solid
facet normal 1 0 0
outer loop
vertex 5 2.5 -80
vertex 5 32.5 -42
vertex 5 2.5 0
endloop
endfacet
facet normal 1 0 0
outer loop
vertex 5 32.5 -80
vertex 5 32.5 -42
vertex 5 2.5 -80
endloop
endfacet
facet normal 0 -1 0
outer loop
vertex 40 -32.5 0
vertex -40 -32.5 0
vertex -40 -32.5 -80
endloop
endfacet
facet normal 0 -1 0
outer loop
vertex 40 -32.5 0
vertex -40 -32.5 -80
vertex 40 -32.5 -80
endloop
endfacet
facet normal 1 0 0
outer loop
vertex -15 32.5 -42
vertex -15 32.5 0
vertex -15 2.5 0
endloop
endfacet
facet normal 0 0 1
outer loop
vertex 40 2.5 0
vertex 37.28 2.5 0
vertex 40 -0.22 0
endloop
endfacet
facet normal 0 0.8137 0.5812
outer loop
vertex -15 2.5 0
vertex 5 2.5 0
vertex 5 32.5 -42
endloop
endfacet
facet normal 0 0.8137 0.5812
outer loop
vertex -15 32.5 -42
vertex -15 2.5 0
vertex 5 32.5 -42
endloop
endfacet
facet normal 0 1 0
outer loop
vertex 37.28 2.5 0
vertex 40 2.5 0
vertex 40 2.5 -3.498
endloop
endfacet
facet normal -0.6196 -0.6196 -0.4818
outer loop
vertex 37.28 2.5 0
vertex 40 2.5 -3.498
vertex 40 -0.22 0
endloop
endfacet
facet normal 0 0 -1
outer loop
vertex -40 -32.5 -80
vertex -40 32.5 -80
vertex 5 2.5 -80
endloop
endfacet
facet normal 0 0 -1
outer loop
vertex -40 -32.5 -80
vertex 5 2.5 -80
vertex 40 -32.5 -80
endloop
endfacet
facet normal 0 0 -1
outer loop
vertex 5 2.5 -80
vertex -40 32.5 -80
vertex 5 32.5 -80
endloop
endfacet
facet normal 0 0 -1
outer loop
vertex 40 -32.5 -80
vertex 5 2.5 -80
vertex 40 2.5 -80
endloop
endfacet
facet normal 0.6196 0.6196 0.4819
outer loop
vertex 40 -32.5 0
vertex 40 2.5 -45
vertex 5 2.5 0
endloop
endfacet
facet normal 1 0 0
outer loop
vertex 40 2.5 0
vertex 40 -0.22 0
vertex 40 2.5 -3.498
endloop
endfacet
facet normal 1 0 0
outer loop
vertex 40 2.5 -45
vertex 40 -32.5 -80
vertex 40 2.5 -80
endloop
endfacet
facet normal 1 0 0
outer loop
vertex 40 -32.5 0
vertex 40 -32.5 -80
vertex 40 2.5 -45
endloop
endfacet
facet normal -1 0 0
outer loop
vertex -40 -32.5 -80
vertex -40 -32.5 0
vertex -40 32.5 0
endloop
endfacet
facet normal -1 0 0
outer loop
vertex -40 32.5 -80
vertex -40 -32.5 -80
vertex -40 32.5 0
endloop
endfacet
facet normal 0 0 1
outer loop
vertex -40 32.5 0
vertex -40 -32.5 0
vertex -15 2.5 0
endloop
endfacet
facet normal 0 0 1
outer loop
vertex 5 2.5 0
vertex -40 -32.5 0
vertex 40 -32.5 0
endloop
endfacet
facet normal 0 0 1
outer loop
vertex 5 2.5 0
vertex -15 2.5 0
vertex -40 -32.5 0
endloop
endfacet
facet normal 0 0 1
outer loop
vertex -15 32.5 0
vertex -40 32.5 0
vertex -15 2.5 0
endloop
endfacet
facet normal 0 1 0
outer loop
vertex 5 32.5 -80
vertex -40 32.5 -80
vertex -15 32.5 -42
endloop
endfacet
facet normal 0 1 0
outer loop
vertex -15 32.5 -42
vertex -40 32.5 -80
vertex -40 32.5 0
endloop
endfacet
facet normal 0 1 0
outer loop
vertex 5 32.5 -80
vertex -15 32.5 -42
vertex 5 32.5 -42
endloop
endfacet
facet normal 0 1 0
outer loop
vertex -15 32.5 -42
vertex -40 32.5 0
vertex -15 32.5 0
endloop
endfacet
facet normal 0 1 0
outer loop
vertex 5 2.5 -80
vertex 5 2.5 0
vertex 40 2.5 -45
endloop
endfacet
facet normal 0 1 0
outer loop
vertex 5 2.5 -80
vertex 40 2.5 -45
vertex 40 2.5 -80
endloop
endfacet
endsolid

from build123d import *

# Parameters (mm, degrees)
SKETCH1_W           = 80
SKETCH1_H           = 65
BOSS_EXTRUDE1_DEPTH = 80
SKETCH2_W           = 80
SKETCH2_H           = 30
CUT_EXTRUDE1_DEPTH  = 35
CUT_EXTRUDE2_DEPTH  = 20
CUT_EXTRUDE8_DEPTH  = 20


with BuildPart() as part:
    # Sketch1 → Boss-Extrude1 (new body)
    with BuildSketch(Plane.XY):
        Rectangle(SKETCH1_W, SKETCH1_H)
    extrude(amount=-BOSS_EXTRUDE1_DEPTH)

    # Sketch2 → Cut-Extrude1 (cut)
    with BuildSketch(Plane(origin=(40, 0, 0), x_dir=(0, 0, -1), z_dir=(1, 0, 0))):
        with Locations((40, 17.5)):
            Rectangle(SKETCH2_W, SKETCH2_H)
    extrude(amount=-CUT_EXTRUDE1_DEPTH, mode=Mode.SUBTRACT)

    # Sketch3 → Cut-Extrude2 (cut)
    with BuildSketch(Plane(origin=(5, 0, 0), x_dir=(0, 0, -1), z_dir=(1, 0, 0))):
        Polygon((42, 32.5), (0, 32.5), (0, 2.5), align=None)
    extrude(amount=-CUT_EXTRUDE2_DEPTH, mode=Mode.SUBTRACT)

    # Sketch6 → Cut-Extrude8 (cut)
    with BuildSketch(Plane(origin=(2.879146919, 2.879146919, 2.239336493), x_dir=(0.7849291331552356, -0.4890712291198004, -0.38038873375984483), z_dir=(0.6195855517393627, 0.6195855517393629, 0.4818998735750602))):
        Polygon((47.291980273, 37.055701316), (47.291980273, -19.953069939), (2.701967593, 1.534851534), align=None)
    extrude(amount=CUT_EXTRUDE8_DEPTH, mode=Mode.SUBTRACT)


with BuildPart() as cut_extrude8_piece_1:
    # of the separate pieces the step leaves, piece 1, a body of its own (cut_extrude8_pieces)
    add(part.part.solids().sort_by_distance((-40, 32.5, 0))[0])


with BuildPart() as cut_extrude8_piece_2:
    # of the separate pieces the step leaves, piece 2, a body of its own (cut_extrude8_pieces)
    add(part.part.solids().sort_by_distance((40, 2.5, 0))[0])


solid = Compound([cut_extrude8_piece_1.part, cut_extrude8_piece_2.part])
